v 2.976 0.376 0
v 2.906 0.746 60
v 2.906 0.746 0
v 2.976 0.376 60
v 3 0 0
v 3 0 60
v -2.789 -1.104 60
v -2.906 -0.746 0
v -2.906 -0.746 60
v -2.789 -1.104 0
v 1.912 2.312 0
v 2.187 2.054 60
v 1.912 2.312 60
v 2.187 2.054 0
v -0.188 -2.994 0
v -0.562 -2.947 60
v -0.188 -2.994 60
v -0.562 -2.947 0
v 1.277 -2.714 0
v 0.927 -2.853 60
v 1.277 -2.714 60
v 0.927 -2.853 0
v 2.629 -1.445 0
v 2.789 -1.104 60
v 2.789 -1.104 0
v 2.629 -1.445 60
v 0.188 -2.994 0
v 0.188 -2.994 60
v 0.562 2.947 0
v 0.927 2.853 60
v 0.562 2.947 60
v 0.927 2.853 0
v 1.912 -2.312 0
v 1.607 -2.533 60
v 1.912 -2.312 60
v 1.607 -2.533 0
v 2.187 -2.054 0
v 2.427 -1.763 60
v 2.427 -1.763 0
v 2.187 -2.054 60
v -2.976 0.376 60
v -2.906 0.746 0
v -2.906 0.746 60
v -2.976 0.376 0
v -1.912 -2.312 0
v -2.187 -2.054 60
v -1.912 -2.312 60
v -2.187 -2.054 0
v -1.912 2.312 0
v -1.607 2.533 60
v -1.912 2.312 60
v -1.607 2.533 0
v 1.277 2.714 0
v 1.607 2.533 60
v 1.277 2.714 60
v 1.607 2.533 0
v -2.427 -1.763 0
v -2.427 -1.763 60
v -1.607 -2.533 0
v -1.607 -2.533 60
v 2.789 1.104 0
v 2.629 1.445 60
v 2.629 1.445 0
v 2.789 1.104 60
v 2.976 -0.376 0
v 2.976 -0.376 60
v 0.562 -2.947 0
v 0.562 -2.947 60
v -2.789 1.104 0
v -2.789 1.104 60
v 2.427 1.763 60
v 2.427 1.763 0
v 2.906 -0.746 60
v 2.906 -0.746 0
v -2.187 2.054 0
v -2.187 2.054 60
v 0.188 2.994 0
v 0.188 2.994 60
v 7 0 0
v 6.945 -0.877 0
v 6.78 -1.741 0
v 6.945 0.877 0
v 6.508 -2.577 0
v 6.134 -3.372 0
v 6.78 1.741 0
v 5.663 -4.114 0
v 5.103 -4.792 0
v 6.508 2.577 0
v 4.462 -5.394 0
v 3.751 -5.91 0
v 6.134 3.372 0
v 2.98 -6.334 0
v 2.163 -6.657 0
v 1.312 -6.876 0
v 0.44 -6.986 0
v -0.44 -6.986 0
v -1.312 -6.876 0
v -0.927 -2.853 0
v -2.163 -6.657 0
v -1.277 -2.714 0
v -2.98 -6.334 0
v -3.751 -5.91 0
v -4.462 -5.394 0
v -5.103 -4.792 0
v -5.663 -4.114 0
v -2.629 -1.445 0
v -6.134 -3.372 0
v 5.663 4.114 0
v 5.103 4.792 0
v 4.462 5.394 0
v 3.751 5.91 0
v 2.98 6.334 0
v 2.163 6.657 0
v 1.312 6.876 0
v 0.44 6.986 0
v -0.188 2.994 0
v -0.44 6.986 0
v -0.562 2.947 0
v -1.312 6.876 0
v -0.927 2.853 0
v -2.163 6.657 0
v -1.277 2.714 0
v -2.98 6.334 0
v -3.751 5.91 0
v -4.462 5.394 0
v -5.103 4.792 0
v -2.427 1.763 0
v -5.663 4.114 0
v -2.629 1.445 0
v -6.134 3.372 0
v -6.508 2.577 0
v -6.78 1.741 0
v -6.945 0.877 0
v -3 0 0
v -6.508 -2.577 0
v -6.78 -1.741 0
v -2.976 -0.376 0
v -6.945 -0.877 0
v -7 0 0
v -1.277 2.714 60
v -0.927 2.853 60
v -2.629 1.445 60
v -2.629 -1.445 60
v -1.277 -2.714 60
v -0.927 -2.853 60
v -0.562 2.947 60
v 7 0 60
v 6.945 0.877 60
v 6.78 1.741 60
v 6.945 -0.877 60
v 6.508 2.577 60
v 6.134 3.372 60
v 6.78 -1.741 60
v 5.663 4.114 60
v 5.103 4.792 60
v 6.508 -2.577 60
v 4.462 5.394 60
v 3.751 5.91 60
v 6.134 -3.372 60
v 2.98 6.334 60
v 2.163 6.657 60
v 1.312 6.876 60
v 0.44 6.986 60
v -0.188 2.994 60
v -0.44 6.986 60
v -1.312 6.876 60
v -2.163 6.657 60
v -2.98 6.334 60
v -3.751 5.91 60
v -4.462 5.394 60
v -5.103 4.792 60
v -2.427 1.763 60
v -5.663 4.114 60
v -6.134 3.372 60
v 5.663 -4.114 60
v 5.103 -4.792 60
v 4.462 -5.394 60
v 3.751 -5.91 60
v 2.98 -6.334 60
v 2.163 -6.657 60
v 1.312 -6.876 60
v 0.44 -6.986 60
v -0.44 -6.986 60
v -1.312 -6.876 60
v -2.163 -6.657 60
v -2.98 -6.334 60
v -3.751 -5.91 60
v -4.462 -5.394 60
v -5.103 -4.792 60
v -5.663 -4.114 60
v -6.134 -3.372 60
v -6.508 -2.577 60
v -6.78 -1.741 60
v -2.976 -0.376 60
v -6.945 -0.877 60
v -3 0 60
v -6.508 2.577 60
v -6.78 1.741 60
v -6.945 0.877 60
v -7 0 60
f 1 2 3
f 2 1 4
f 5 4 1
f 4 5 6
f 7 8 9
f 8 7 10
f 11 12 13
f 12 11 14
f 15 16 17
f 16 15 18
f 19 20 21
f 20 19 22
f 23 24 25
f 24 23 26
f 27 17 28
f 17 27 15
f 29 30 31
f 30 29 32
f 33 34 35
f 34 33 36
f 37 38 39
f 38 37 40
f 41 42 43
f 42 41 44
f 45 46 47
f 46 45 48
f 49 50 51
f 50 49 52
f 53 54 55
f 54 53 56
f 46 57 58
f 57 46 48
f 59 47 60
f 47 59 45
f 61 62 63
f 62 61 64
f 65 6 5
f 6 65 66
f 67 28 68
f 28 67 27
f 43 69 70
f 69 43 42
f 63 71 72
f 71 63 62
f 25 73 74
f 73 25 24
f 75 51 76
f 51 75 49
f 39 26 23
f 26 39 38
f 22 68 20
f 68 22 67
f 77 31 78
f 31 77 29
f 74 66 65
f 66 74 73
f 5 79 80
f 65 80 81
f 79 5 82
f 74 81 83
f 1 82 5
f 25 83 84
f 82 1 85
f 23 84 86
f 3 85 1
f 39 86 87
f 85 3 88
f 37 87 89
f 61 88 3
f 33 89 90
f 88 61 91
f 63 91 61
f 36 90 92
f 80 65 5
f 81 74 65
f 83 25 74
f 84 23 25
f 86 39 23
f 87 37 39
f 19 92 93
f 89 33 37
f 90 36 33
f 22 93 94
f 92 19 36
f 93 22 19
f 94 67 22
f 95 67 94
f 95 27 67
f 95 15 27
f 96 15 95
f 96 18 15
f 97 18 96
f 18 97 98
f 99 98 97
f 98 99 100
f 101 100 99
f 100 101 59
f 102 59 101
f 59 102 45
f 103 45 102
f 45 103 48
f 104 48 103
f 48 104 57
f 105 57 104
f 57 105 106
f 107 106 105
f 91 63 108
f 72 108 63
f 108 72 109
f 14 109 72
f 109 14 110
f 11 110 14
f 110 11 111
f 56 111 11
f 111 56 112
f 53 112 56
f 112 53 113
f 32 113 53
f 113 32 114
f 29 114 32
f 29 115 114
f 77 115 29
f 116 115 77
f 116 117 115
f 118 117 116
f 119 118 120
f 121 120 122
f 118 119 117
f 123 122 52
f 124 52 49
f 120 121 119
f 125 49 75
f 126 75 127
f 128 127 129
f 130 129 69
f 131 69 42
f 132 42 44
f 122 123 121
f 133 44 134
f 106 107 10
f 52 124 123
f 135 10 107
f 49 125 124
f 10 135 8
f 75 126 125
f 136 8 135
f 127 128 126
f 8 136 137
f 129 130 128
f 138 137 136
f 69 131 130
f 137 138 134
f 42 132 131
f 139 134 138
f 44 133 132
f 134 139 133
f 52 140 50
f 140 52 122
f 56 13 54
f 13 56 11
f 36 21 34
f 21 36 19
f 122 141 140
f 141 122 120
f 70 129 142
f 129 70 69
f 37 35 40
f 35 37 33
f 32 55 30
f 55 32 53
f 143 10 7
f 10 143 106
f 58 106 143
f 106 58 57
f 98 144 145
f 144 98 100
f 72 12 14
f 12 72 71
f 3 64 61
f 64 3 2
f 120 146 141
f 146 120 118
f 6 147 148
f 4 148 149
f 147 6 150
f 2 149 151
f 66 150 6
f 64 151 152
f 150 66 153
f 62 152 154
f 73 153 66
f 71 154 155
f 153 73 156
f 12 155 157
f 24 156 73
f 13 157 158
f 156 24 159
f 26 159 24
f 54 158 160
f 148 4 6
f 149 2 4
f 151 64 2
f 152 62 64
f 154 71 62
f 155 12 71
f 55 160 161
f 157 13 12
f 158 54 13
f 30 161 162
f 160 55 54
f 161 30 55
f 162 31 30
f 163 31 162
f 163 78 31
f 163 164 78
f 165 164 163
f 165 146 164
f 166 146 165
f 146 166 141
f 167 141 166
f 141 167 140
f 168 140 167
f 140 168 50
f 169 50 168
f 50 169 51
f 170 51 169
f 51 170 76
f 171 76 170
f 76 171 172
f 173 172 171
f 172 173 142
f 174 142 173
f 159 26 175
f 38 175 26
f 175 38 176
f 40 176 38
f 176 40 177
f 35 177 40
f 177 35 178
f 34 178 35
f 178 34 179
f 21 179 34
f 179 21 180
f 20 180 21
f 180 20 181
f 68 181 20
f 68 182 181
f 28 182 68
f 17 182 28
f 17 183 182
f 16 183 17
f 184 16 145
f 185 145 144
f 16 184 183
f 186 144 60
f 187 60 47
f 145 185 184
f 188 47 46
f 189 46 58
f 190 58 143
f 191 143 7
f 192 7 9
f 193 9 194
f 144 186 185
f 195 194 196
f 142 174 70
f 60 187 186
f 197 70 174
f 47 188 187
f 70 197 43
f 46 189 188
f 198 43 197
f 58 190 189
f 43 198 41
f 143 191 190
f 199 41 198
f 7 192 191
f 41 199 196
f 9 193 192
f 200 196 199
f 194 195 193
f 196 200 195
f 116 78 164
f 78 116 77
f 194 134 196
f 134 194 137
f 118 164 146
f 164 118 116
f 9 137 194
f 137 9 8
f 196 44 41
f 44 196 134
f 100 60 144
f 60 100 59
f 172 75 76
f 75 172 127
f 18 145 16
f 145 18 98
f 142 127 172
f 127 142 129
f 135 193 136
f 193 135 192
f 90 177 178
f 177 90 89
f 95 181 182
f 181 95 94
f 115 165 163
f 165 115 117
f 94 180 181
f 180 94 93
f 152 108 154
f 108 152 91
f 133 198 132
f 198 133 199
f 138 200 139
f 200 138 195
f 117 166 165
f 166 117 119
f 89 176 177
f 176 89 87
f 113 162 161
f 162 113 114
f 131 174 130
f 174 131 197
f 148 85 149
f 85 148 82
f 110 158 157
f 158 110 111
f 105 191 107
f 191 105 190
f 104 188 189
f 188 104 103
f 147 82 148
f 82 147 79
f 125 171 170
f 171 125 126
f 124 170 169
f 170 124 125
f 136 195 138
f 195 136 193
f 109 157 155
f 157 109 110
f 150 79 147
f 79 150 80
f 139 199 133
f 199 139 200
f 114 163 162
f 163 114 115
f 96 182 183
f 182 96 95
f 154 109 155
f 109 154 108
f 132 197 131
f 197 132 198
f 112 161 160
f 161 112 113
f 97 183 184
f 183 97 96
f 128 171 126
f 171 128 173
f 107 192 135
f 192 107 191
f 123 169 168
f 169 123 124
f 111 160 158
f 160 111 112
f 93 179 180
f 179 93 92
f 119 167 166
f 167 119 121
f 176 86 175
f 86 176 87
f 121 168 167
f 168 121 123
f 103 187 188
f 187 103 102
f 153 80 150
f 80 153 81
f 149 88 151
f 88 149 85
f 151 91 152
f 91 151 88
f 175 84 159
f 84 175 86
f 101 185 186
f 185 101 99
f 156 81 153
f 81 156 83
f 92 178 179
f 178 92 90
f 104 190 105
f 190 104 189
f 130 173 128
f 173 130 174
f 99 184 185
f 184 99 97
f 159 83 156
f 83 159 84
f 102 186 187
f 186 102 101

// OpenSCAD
$fn = 50;


difference() {
	union() {
		cylinder(h = 60, r = 7.0000000000);
	}
	union() {
		cylinder(h = 60, r = 3.0000000000);
		cylinder(h = 60, r = 3.0000000000);
		cylinder(h = 60, r = 1.5000000000);
		cylinder(h = 60, r = 1.5000000000);
		cylinder(h = 60, r = 1.5000000000);
		cylinder(h = 60, r = 1.5000000000);
		cylinder(h = 60, r = 1.5000000000);
		cylinder(h = 60, r = 1.5000000000);
	}
}
